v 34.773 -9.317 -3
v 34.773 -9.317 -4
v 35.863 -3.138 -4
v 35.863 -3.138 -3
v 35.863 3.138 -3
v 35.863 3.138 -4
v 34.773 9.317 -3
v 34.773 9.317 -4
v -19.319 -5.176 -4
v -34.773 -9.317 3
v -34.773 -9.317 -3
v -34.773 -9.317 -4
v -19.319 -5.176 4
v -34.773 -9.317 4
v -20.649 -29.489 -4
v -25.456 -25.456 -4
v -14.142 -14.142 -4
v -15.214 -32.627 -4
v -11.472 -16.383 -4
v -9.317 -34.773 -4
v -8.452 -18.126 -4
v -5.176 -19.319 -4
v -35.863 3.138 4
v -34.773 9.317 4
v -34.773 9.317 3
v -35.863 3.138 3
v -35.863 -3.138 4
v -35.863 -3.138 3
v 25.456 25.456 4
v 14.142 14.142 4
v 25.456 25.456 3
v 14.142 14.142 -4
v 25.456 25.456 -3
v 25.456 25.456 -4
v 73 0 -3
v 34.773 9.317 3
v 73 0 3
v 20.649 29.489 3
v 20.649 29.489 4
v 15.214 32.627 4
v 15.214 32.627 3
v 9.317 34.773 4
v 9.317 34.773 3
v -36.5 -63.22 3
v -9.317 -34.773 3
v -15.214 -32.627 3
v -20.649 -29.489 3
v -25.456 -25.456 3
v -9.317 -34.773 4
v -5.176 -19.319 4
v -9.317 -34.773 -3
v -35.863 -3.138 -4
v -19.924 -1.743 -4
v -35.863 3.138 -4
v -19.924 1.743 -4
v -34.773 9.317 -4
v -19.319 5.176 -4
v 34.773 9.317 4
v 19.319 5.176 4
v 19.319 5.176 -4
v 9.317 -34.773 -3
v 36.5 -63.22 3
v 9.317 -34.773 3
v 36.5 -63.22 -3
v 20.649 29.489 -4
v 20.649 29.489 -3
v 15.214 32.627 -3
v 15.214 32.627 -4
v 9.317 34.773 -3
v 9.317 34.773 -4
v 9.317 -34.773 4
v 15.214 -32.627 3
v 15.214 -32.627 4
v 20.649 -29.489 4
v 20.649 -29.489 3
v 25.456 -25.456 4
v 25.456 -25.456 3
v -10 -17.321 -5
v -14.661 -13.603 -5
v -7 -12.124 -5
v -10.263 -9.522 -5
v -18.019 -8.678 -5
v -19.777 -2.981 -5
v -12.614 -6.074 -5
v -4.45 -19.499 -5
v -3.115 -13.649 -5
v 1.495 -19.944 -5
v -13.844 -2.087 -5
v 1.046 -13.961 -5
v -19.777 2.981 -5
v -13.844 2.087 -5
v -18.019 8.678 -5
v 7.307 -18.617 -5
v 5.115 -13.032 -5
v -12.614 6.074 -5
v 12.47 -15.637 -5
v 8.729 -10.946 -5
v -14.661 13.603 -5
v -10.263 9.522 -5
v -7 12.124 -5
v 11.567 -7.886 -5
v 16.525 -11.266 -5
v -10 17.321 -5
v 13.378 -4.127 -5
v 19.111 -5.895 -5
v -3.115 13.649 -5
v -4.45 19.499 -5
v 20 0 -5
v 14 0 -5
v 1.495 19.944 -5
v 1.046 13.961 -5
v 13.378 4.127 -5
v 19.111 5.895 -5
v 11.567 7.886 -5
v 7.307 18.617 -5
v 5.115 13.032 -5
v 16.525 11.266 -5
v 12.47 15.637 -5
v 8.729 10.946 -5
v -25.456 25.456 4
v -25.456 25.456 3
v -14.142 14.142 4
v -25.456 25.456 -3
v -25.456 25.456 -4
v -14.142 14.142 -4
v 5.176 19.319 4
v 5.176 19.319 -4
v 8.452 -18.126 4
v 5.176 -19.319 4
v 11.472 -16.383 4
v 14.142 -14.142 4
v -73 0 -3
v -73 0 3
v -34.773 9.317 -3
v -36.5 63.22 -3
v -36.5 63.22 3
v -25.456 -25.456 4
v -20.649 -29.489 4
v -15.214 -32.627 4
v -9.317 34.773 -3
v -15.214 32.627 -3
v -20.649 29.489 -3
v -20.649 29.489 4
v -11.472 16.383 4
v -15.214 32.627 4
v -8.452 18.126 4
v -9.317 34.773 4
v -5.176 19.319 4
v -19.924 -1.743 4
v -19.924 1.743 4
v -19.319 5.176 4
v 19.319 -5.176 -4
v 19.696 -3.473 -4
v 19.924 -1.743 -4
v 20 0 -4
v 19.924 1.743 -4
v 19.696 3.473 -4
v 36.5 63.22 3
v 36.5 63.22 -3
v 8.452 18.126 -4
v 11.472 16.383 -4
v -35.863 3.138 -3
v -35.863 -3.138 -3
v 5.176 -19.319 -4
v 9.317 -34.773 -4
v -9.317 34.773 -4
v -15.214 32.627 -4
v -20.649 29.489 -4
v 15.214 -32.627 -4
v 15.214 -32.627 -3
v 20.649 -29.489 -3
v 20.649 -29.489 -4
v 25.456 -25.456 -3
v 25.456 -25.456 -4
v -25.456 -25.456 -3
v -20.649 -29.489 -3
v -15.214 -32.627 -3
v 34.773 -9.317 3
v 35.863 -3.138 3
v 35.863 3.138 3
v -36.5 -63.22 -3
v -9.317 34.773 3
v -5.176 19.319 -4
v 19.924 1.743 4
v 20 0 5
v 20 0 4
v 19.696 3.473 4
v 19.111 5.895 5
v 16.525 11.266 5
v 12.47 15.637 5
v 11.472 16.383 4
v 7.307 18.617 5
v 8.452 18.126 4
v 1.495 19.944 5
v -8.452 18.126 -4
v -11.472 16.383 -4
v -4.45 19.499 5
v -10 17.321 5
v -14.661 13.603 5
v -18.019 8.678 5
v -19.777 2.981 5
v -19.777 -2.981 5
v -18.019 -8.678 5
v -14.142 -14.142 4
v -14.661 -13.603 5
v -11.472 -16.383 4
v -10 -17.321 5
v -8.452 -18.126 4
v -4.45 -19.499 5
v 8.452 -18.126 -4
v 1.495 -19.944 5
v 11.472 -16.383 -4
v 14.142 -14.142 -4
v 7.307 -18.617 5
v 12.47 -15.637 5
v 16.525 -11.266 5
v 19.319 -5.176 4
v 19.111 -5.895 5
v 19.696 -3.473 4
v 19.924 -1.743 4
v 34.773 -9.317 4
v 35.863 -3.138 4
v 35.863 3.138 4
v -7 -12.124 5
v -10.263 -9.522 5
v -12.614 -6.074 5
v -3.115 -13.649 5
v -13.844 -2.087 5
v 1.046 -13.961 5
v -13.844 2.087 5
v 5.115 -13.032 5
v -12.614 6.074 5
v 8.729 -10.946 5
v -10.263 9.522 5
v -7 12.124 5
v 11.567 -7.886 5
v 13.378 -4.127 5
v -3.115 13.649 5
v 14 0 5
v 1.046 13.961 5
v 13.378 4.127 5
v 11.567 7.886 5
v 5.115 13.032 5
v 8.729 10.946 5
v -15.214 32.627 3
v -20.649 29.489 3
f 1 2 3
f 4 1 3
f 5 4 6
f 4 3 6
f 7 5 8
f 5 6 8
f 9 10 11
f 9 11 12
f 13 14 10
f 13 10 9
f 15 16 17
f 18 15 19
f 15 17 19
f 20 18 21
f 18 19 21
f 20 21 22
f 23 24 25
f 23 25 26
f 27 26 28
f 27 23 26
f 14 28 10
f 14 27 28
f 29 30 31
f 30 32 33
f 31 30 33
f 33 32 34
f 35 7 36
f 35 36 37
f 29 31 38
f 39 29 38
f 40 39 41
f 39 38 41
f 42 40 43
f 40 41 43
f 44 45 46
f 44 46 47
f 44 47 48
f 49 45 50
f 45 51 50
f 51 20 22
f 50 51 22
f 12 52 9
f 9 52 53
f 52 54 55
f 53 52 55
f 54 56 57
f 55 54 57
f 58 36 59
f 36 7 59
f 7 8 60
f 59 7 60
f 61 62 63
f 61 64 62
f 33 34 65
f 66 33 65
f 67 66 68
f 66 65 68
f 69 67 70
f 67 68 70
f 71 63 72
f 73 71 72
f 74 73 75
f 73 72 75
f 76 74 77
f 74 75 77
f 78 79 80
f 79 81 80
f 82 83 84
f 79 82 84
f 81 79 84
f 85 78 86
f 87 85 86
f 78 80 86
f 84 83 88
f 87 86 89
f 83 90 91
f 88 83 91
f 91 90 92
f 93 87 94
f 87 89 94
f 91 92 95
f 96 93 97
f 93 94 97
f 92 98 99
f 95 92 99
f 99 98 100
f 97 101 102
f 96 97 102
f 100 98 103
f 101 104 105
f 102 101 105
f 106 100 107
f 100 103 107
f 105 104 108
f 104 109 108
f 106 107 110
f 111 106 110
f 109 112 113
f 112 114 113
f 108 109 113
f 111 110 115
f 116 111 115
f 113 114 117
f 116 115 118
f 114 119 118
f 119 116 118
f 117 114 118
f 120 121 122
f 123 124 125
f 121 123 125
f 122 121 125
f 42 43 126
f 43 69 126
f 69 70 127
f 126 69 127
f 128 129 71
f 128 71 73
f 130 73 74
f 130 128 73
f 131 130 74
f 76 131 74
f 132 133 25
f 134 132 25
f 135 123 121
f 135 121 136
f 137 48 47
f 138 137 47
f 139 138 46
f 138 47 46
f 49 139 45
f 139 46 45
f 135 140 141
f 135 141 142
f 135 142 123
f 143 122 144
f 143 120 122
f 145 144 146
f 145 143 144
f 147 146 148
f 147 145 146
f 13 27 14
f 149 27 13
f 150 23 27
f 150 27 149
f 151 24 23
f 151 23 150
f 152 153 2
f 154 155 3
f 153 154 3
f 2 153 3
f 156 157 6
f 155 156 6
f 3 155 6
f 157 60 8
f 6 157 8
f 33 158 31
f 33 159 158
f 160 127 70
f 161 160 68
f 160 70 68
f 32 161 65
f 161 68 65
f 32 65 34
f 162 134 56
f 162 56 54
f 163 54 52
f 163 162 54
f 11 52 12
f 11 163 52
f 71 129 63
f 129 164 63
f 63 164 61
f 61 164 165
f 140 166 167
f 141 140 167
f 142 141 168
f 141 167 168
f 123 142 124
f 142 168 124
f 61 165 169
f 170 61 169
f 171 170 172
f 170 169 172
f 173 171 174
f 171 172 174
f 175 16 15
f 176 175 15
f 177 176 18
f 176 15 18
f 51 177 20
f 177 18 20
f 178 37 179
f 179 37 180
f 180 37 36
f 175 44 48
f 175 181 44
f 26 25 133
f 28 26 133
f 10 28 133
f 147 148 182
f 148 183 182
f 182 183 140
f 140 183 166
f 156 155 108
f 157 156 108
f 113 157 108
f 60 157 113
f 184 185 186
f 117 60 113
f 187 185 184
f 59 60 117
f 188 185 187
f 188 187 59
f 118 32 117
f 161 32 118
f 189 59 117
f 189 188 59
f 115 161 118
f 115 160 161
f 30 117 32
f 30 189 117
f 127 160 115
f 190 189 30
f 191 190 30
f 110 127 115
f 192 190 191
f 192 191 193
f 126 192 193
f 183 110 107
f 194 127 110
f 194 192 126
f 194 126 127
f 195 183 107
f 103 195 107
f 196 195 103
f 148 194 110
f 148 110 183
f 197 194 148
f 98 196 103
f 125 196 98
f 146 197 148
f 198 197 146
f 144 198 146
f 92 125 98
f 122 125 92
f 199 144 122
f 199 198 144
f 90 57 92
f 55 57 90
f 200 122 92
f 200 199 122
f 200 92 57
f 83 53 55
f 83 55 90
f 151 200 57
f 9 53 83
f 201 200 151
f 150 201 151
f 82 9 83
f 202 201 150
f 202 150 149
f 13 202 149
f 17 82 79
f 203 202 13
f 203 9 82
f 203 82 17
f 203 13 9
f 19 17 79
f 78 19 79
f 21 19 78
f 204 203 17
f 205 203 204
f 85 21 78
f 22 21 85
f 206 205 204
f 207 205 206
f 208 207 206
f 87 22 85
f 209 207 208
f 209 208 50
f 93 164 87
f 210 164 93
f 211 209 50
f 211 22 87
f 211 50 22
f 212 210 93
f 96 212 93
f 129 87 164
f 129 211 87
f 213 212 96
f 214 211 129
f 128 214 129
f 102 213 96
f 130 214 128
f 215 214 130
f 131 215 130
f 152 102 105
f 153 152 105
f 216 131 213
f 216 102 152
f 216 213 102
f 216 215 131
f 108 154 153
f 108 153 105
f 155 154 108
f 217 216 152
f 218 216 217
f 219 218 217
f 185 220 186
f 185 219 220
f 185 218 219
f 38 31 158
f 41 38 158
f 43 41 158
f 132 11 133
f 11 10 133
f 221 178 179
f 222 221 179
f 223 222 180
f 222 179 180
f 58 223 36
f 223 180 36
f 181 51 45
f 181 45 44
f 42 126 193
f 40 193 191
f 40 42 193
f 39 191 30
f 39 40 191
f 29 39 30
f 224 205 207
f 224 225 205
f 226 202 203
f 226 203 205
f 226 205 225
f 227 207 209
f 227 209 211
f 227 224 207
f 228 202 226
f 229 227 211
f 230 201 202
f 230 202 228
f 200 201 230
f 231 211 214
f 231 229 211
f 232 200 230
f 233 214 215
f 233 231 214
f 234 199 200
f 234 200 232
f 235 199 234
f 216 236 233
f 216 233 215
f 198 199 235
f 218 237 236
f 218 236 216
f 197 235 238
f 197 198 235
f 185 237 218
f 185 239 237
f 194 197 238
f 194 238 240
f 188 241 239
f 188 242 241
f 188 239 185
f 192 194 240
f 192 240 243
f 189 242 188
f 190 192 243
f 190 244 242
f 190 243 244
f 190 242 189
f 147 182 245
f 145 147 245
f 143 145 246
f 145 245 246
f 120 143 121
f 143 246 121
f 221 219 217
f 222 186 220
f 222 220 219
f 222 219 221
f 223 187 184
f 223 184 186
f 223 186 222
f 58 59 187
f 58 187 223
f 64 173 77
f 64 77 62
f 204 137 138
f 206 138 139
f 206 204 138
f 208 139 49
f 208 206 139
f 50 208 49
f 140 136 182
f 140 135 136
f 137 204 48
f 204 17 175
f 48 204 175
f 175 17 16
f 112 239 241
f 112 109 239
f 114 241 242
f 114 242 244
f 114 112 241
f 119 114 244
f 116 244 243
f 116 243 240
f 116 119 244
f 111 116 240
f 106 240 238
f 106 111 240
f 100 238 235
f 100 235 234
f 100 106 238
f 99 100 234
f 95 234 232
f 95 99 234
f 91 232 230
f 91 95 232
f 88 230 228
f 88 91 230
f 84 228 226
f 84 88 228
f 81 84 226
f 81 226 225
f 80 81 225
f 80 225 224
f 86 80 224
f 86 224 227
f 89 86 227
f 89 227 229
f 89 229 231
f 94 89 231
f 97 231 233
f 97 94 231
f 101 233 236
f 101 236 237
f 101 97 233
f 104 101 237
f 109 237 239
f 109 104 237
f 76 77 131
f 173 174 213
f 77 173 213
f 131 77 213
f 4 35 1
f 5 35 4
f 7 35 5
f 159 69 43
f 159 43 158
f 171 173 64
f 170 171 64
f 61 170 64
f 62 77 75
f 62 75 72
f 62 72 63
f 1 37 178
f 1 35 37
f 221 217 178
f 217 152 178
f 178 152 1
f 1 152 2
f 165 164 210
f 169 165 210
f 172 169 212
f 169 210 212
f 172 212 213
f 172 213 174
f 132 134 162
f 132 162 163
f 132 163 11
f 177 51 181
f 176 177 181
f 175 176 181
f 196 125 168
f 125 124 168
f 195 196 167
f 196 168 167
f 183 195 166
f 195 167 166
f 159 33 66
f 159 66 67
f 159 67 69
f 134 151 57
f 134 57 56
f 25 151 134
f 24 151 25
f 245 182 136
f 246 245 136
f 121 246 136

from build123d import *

# Parameters (mm, degrees)
SKETCH1_R           = 20
SKETCH1_R_2         = 14
BOSS_EXTRUDE1_DEPTH = 5
BOSS_EXTRUDE2_DEPTH = 4
BOSS_EXTRUDE3_DEPTH = 3


with BuildPart() as part:
    # Sketch1 → Boss-Extrude1 (new, symmetric)
    with BuildSketch(Plane.XY):
        Circle(SKETCH1_R)
        Circle(SKETCH1_R_2, mode=Mode.SUBTRACT)
    extrude(amount=BOSS_EXTRUDE1_DEPTH, both=True)

    # Sketch1_3 → Boss-Extrude2 (add, symmetric)
    with BuildSketch(Plane.XY):
        with BuildLine():
            ThreePointArc((-14.142135624, 14.142135624), (-10, 17.320508076), (-5.176380902, 19.318516526))
            Line((-5.176380902, 19.318516526), (-9.317485624, 34.773329746))
            ThreePointArc((-9.317485624, 34.773329746), (-18, 31.176914536), (-25.455844123, 25.455844123))
            Line((-25.455844123, 25.455844123), (-14.142135624, 14.142135624))
        make_face()
        with BuildLine():
            ThreePointArc((5.176380902, 19.318516526), (10, 17.320508076), (14.142135624, 14.142135624))
            Line((14.142135624, 14.142135624), (25.455844123, 25.455844123))
            ThreePointArc((25.455844123, 25.455844123), (18, 31.176914536), (9.317485624, 34.773329746))
            Line((9.317485624, 34.773329746), (5.176380902, 19.318516526))
        make_face()
        with BuildLine():
            Line((34.773329746, 9.317485624), (19.318516526, 5.176380902))
            ThreePointArc((19.318516526, 5.176380902), (19.828897227, 2.610523844), (20, 0))
            ThreePointArc((20, 0), (19.828897227, -2.610523844), (19.318516526, -5.176380902))
            Line((19.318516526, -5.176380902), (34.773329746, -9.317485624))
            ThreePointArc((34.773329746, -9.317485624), (36, 0), (34.773329746, 9.317485624))
        make_face()
        with BuildLine():
            Line((25.455844123, -25.455844123), (14.142135624, -14.142135624))
            ThreePointArc((14.142135624, -14.142135624), (10, -17.320508076), (5.176380902, -19.318516526))
            Line((5.176380902, -19.318516526), (9.317485624, -34.773329746))
            ThreePointArc((9.317485624, -34.773329746), (18, -31.176914536), (25.455844123, -25.455844123))
        make_face()
        with BuildLine():
            Line((-9.317485624, -34.773329746), (-5.176380902, -19.318516526))
            ThreePointArc((-5.176380902, -19.318516526), (-10, -17.320508076), (-14.142135624, -14.142135624))
            Line((-14.142135624, -14.142135624), (-25.455844123, -25.455844123))
            ThreePointArc((-25.455844123, -25.455844123), (-18, -31.176914536), (-9.317485624, -34.773329746))
        make_face()
        with BuildLine():
            ThreePointArc((-19.318516526, -5.176380902), (-20, 0), (-19.318516526, 5.176380902))
            Line((-19.318516526, 5.176380902), (-34.773329746, 9.317485624))
            ThreePointArc((-34.773329746, 9.317485624), (-36, 0), (-34.773329746, -9.317485624))
            Line((-34.773329746, -9.317485624), (-19.318516526, -5.176380902))
        make_face()
    extrude(amount=BOSS_EXTRUDE2_DEPTH, both=True)

    # Sketch1_4 → Boss-Extrude3 (add, symmetric)
    with BuildSketch(Plane.XY):
        with BuildLine():
            ThreePointArc((-9.317485624, 34.773329746), (-18, 31.176914536), (-25.455844123, 25.455844123))
            Line((-25.455844123, 25.455844123), (-36.5, 63.219854476))
            Line((-36.5, 63.219854476), (-9.317485624, 34.773329746))
        make_face()
        with BuildLine():
            ThreePointArc((25.455844123, 25.455844123), (18, 31.176914536), (9.317485624, 34.773329746))
            Line((9.317485624, 34.773329746), (36.5, 63.219854476))
            Line((36.5, 63.219854476), (25.455844123, 25.455844123))
        make_face()
        with BuildLine():
            ThreePointArc((34.773329746, -9.317485624), (36, 0), (34.773329746, 9.317485624))
            Line((34.773329746, 9.317485624), (73, 0))
            Line((73, 0), (34.773329746, -9.317485624))
        make_face()
        with BuildLine():
            ThreePointArc((9.317485624, -34.773329746), (18, -31.176914536), (25.455844123, -25.455844123))
            Line((25.455844123, -25.455844123), (36.5, -63.219854476))
            Line((36.5, -63.219854476), (9.317485624, -34.773329746))
        make_face()
        with BuildLine():
            ThreePointArc((-25.455844123, -25.455844123), (-18, -31.176914536), (-9.317485624, -34.773329746))
            Line((-9.317485624, -34.773329746), (-36.5, -63.219854476))
            Line((-36.5, -63.219854476), (-25.455844123, -25.455844123))
        make_face()
        with BuildLine():
            ThreePointArc((-34.773329746, 9.317485624), (-36, 0), (-34.773329746, -9.317485624))
            Line((-34.773329746, -9.317485624), (-73, 0))
            Line((-73, 0), (-34.773329746, 9.317485624))
        make_face()
    extrude(amount=BOSS_EXTRUDE3_DEPTH, both=True)


solid = part.part
